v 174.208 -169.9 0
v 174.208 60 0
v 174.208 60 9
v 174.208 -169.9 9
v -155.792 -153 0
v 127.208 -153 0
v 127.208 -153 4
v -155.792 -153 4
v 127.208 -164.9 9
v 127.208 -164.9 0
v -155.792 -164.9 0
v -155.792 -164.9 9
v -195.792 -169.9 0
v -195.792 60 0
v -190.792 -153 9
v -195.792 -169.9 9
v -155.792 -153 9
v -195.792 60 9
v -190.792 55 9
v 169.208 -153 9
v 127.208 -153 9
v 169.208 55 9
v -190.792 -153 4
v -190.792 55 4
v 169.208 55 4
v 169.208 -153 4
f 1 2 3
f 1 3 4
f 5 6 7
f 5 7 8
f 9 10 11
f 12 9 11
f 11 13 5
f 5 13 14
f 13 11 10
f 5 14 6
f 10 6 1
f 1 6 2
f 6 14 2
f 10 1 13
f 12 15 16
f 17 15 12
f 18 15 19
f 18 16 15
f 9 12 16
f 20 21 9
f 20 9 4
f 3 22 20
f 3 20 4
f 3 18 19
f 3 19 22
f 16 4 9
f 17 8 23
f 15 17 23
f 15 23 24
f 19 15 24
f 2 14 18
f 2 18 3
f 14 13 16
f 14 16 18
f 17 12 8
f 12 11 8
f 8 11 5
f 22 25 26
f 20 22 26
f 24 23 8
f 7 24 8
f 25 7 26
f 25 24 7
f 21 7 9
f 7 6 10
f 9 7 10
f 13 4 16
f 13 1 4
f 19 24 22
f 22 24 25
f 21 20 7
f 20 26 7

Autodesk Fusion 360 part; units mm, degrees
sketch "Szkic1" plane through (0, 0, 0) normal (0, 0, 1) x (1, 0, 0)
  line L0 (-190.7916, 55) -> (169.2084, 55)
  line L1 (169.2084, 55) -> (169.2084, -153)
  line L2 (169.2084, -153) -> (-190.7916, -153)
  line L3 (-190.7916, -153) -> (-190.7916, 55)
  line L4 (-186.2916, 51.8) -> (159.7084, 51.8)
  line L5 (159.7084, 51.8) -> (159.7084, -145.2)
  line L6 (159.7084, -145.2) -> (-186.2916, -145.2)
  line L7 (-186.2916, -145.2) -> (-186.2916, 51.8)
  line L8 (-155.7916, -153) -> (127.2084, -153)
  line L9 (127.2084, -153) -> (127.2084, -164.9)
  line L10 (127.2084, -164.9) -> (-155.7916, -164.9)
  line L11 (-155.7916, -164.9) -> (-155.7916, -153)
  line L12 (-195.7916, 60) -> (174.2084, 60)
  line L13 (174.2084, 60) -> (174.2084, -169.9)
  line L14 (174.2084, -169.9) -> (-195.7916, -169.9)
  line L15 (-195.7916, -169.9) -> (-195.7916, 60)
  dimension "d1" = 360
  dimension "d2" = 208
  dimension "d3" = 346
  dimension "d4" = 197
  dimension "d5" = 9.5
  dimension "d6" = 7.8
  dimension "d7" = 11.9
  dimension "d8" = 35
  dimension "d9" = 283
  dimension "d10" = 370
  dimension "d11" = 5
  dimension "d12" = 5
  dimension "d13" = 5
extrude "Wyciągnięcie proste1" add sketch "Szkic1" along normal blind 5 contours L12 L13 L14 L15
extrude "Wyciągnięcie proste2" add 1 faces at (156.8751, -162.6, 5) along direction (0, 0, 1) blind 4
extrude "Wyciągnięcie proste3" add sketch "Szkic1" along normal blind 4 contours L0 L1 L2 L3 L8 | L4 L5 L6 L7
